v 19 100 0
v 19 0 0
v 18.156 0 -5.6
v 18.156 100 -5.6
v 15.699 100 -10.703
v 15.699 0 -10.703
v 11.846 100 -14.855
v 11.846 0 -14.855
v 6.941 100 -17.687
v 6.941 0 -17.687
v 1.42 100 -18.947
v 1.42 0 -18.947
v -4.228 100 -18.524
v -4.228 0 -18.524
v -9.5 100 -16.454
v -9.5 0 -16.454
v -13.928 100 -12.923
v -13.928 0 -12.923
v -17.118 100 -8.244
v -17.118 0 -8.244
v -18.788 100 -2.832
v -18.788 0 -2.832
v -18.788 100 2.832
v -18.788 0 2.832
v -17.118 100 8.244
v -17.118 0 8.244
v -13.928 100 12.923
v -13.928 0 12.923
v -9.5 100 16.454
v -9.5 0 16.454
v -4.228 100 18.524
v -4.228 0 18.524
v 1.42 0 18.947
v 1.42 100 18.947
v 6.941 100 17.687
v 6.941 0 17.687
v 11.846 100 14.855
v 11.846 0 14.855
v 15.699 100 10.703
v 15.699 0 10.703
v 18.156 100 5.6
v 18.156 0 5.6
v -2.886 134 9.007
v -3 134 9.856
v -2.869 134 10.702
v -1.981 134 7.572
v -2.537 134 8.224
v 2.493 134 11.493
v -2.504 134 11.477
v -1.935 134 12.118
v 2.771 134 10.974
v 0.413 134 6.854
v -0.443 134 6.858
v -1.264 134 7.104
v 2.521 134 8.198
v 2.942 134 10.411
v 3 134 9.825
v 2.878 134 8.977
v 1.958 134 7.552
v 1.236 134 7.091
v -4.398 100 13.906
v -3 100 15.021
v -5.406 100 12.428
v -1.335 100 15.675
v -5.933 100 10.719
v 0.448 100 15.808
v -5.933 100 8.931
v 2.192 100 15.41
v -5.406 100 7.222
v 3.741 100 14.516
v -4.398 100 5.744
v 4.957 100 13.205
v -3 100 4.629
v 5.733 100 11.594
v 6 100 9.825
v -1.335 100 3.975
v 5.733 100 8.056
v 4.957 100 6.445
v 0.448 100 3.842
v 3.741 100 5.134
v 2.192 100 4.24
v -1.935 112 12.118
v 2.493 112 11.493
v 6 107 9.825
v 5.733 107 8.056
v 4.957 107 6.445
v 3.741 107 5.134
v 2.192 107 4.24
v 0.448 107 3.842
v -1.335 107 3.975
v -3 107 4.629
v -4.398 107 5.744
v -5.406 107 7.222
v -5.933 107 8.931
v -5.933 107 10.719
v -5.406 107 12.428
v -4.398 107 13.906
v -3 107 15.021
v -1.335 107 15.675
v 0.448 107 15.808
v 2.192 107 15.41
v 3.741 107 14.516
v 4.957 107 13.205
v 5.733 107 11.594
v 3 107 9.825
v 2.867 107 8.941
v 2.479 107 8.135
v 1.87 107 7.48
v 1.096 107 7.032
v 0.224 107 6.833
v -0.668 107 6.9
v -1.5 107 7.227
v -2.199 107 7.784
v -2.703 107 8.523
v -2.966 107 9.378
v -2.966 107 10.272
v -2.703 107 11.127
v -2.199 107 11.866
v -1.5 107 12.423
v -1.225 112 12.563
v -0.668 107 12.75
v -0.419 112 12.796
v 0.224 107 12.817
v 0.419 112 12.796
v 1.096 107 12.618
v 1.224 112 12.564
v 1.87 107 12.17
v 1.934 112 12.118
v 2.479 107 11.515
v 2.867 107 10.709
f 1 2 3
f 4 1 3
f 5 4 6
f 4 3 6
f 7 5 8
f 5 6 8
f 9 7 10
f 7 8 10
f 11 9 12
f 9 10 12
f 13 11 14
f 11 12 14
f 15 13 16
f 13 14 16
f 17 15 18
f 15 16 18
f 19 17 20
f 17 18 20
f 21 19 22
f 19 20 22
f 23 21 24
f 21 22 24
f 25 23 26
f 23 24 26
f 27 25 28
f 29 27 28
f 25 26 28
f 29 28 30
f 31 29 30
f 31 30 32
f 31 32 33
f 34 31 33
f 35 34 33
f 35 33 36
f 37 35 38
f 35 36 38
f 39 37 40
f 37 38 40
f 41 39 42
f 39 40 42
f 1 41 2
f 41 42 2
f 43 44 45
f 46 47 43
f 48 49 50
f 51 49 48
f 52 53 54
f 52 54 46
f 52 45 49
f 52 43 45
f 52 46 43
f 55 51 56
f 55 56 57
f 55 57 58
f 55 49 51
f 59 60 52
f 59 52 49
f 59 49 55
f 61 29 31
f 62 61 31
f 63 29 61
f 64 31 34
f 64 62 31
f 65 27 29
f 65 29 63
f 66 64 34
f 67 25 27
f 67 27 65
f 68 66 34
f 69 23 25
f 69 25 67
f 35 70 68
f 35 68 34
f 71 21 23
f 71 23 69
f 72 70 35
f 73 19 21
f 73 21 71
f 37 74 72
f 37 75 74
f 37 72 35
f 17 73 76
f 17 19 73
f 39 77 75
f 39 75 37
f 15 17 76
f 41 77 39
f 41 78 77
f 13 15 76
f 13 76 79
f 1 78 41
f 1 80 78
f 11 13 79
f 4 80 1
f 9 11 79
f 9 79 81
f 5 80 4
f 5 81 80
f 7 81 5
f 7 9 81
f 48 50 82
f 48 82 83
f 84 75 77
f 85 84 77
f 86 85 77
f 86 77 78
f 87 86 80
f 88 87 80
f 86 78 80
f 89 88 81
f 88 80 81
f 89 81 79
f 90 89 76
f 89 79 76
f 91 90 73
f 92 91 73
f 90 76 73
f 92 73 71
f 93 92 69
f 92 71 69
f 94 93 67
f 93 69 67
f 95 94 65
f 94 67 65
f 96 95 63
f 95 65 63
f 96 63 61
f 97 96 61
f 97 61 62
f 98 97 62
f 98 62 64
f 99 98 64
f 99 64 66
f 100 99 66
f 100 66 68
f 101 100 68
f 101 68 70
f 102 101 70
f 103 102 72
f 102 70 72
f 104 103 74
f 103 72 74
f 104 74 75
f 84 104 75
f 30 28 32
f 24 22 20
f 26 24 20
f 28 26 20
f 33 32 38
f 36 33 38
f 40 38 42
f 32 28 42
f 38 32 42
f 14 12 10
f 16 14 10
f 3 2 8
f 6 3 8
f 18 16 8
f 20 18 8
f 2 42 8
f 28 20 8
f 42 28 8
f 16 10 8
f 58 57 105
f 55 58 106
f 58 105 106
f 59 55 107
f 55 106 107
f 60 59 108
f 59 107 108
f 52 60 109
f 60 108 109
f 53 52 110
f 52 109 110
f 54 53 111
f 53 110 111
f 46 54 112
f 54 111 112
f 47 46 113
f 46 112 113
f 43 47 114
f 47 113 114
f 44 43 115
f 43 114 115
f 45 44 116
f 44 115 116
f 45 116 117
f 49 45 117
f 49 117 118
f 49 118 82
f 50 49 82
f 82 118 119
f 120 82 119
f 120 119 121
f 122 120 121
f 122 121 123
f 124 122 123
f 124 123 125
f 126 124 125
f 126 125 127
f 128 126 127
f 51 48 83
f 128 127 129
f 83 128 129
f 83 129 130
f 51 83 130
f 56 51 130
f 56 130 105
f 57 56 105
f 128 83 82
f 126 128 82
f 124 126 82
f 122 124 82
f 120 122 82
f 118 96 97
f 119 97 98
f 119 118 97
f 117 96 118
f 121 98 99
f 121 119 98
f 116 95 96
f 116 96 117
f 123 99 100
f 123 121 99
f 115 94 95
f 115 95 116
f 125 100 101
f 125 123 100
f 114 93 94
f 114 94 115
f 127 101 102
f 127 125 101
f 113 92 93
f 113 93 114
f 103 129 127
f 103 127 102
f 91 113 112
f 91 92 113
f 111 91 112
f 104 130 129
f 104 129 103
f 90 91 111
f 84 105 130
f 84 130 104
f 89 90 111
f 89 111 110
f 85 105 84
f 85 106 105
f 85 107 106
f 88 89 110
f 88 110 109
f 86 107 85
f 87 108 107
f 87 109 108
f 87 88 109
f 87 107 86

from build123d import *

# Parameters (mm, degrees)
SKETCH1_R           = 19
BOSS_EXTRUDE1_DEPTH = 100
SKETCH2_R           = 6
BOSS_EXTRUDE2_DEPTH = 7
SKETCH3_R           = 3
BOSS_EXTRUDE3_DEPTH = 27
CUT_EXTRUDE1_DEPTH  = 22


with BuildPart() as part:
    # Sketch1 → Boss-Extrude1 (new body)
    with BuildSketch(Plane(origin=(0, 0, 0), x_dir=(1, 0, 0), z_dir=(0, 1, 0))):
        Circle(SKETCH1_R)
    extrude(amount=BOSS_EXTRUDE1_DEPTH)

    # Sketch2 → Boss-Extrude2 (add)
    with BuildSketch(Plane(origin=(0, 100, 0), x_dir=(1, 0, 0), z_dir=(0, 1, 0))):
        with Locations((0, -9.825)):
            Circle(SKETCH2_R)
    extrude(amount=BOSS_EXTRUDE2_DEPTH)

    # Sketch3 → Boss-Extrude3 (add)
    with BuildSketch(Plane(origin=(0, 107, 0), x_dir=(1, 0, 0), z_dir=(0, 1, 0))):
        with Locations((0, -9.825)):
            Circle(SKETCH3_R)
    extrude(amount=BOSS_EXTRUDE3_DEPTH)

    # Sketch4 → Cut-Extrude1 (cut)
    with BuildSketch(Plane(origin=(0, 134, 0), x_dir=(1, 0, 0), z_dir=(0, 1, 0))):
        Polygon((-9.150633985, -13.135072473), (10.849366015, -10.314966588), (10.988990103, -11.30517117), (-9.011009897, -14.125277054), align=None)
    extrude(amount=-CUT_EXTRUDE1_DEPTH, mode=Mode.SUBTRACT)


solid = part.part
